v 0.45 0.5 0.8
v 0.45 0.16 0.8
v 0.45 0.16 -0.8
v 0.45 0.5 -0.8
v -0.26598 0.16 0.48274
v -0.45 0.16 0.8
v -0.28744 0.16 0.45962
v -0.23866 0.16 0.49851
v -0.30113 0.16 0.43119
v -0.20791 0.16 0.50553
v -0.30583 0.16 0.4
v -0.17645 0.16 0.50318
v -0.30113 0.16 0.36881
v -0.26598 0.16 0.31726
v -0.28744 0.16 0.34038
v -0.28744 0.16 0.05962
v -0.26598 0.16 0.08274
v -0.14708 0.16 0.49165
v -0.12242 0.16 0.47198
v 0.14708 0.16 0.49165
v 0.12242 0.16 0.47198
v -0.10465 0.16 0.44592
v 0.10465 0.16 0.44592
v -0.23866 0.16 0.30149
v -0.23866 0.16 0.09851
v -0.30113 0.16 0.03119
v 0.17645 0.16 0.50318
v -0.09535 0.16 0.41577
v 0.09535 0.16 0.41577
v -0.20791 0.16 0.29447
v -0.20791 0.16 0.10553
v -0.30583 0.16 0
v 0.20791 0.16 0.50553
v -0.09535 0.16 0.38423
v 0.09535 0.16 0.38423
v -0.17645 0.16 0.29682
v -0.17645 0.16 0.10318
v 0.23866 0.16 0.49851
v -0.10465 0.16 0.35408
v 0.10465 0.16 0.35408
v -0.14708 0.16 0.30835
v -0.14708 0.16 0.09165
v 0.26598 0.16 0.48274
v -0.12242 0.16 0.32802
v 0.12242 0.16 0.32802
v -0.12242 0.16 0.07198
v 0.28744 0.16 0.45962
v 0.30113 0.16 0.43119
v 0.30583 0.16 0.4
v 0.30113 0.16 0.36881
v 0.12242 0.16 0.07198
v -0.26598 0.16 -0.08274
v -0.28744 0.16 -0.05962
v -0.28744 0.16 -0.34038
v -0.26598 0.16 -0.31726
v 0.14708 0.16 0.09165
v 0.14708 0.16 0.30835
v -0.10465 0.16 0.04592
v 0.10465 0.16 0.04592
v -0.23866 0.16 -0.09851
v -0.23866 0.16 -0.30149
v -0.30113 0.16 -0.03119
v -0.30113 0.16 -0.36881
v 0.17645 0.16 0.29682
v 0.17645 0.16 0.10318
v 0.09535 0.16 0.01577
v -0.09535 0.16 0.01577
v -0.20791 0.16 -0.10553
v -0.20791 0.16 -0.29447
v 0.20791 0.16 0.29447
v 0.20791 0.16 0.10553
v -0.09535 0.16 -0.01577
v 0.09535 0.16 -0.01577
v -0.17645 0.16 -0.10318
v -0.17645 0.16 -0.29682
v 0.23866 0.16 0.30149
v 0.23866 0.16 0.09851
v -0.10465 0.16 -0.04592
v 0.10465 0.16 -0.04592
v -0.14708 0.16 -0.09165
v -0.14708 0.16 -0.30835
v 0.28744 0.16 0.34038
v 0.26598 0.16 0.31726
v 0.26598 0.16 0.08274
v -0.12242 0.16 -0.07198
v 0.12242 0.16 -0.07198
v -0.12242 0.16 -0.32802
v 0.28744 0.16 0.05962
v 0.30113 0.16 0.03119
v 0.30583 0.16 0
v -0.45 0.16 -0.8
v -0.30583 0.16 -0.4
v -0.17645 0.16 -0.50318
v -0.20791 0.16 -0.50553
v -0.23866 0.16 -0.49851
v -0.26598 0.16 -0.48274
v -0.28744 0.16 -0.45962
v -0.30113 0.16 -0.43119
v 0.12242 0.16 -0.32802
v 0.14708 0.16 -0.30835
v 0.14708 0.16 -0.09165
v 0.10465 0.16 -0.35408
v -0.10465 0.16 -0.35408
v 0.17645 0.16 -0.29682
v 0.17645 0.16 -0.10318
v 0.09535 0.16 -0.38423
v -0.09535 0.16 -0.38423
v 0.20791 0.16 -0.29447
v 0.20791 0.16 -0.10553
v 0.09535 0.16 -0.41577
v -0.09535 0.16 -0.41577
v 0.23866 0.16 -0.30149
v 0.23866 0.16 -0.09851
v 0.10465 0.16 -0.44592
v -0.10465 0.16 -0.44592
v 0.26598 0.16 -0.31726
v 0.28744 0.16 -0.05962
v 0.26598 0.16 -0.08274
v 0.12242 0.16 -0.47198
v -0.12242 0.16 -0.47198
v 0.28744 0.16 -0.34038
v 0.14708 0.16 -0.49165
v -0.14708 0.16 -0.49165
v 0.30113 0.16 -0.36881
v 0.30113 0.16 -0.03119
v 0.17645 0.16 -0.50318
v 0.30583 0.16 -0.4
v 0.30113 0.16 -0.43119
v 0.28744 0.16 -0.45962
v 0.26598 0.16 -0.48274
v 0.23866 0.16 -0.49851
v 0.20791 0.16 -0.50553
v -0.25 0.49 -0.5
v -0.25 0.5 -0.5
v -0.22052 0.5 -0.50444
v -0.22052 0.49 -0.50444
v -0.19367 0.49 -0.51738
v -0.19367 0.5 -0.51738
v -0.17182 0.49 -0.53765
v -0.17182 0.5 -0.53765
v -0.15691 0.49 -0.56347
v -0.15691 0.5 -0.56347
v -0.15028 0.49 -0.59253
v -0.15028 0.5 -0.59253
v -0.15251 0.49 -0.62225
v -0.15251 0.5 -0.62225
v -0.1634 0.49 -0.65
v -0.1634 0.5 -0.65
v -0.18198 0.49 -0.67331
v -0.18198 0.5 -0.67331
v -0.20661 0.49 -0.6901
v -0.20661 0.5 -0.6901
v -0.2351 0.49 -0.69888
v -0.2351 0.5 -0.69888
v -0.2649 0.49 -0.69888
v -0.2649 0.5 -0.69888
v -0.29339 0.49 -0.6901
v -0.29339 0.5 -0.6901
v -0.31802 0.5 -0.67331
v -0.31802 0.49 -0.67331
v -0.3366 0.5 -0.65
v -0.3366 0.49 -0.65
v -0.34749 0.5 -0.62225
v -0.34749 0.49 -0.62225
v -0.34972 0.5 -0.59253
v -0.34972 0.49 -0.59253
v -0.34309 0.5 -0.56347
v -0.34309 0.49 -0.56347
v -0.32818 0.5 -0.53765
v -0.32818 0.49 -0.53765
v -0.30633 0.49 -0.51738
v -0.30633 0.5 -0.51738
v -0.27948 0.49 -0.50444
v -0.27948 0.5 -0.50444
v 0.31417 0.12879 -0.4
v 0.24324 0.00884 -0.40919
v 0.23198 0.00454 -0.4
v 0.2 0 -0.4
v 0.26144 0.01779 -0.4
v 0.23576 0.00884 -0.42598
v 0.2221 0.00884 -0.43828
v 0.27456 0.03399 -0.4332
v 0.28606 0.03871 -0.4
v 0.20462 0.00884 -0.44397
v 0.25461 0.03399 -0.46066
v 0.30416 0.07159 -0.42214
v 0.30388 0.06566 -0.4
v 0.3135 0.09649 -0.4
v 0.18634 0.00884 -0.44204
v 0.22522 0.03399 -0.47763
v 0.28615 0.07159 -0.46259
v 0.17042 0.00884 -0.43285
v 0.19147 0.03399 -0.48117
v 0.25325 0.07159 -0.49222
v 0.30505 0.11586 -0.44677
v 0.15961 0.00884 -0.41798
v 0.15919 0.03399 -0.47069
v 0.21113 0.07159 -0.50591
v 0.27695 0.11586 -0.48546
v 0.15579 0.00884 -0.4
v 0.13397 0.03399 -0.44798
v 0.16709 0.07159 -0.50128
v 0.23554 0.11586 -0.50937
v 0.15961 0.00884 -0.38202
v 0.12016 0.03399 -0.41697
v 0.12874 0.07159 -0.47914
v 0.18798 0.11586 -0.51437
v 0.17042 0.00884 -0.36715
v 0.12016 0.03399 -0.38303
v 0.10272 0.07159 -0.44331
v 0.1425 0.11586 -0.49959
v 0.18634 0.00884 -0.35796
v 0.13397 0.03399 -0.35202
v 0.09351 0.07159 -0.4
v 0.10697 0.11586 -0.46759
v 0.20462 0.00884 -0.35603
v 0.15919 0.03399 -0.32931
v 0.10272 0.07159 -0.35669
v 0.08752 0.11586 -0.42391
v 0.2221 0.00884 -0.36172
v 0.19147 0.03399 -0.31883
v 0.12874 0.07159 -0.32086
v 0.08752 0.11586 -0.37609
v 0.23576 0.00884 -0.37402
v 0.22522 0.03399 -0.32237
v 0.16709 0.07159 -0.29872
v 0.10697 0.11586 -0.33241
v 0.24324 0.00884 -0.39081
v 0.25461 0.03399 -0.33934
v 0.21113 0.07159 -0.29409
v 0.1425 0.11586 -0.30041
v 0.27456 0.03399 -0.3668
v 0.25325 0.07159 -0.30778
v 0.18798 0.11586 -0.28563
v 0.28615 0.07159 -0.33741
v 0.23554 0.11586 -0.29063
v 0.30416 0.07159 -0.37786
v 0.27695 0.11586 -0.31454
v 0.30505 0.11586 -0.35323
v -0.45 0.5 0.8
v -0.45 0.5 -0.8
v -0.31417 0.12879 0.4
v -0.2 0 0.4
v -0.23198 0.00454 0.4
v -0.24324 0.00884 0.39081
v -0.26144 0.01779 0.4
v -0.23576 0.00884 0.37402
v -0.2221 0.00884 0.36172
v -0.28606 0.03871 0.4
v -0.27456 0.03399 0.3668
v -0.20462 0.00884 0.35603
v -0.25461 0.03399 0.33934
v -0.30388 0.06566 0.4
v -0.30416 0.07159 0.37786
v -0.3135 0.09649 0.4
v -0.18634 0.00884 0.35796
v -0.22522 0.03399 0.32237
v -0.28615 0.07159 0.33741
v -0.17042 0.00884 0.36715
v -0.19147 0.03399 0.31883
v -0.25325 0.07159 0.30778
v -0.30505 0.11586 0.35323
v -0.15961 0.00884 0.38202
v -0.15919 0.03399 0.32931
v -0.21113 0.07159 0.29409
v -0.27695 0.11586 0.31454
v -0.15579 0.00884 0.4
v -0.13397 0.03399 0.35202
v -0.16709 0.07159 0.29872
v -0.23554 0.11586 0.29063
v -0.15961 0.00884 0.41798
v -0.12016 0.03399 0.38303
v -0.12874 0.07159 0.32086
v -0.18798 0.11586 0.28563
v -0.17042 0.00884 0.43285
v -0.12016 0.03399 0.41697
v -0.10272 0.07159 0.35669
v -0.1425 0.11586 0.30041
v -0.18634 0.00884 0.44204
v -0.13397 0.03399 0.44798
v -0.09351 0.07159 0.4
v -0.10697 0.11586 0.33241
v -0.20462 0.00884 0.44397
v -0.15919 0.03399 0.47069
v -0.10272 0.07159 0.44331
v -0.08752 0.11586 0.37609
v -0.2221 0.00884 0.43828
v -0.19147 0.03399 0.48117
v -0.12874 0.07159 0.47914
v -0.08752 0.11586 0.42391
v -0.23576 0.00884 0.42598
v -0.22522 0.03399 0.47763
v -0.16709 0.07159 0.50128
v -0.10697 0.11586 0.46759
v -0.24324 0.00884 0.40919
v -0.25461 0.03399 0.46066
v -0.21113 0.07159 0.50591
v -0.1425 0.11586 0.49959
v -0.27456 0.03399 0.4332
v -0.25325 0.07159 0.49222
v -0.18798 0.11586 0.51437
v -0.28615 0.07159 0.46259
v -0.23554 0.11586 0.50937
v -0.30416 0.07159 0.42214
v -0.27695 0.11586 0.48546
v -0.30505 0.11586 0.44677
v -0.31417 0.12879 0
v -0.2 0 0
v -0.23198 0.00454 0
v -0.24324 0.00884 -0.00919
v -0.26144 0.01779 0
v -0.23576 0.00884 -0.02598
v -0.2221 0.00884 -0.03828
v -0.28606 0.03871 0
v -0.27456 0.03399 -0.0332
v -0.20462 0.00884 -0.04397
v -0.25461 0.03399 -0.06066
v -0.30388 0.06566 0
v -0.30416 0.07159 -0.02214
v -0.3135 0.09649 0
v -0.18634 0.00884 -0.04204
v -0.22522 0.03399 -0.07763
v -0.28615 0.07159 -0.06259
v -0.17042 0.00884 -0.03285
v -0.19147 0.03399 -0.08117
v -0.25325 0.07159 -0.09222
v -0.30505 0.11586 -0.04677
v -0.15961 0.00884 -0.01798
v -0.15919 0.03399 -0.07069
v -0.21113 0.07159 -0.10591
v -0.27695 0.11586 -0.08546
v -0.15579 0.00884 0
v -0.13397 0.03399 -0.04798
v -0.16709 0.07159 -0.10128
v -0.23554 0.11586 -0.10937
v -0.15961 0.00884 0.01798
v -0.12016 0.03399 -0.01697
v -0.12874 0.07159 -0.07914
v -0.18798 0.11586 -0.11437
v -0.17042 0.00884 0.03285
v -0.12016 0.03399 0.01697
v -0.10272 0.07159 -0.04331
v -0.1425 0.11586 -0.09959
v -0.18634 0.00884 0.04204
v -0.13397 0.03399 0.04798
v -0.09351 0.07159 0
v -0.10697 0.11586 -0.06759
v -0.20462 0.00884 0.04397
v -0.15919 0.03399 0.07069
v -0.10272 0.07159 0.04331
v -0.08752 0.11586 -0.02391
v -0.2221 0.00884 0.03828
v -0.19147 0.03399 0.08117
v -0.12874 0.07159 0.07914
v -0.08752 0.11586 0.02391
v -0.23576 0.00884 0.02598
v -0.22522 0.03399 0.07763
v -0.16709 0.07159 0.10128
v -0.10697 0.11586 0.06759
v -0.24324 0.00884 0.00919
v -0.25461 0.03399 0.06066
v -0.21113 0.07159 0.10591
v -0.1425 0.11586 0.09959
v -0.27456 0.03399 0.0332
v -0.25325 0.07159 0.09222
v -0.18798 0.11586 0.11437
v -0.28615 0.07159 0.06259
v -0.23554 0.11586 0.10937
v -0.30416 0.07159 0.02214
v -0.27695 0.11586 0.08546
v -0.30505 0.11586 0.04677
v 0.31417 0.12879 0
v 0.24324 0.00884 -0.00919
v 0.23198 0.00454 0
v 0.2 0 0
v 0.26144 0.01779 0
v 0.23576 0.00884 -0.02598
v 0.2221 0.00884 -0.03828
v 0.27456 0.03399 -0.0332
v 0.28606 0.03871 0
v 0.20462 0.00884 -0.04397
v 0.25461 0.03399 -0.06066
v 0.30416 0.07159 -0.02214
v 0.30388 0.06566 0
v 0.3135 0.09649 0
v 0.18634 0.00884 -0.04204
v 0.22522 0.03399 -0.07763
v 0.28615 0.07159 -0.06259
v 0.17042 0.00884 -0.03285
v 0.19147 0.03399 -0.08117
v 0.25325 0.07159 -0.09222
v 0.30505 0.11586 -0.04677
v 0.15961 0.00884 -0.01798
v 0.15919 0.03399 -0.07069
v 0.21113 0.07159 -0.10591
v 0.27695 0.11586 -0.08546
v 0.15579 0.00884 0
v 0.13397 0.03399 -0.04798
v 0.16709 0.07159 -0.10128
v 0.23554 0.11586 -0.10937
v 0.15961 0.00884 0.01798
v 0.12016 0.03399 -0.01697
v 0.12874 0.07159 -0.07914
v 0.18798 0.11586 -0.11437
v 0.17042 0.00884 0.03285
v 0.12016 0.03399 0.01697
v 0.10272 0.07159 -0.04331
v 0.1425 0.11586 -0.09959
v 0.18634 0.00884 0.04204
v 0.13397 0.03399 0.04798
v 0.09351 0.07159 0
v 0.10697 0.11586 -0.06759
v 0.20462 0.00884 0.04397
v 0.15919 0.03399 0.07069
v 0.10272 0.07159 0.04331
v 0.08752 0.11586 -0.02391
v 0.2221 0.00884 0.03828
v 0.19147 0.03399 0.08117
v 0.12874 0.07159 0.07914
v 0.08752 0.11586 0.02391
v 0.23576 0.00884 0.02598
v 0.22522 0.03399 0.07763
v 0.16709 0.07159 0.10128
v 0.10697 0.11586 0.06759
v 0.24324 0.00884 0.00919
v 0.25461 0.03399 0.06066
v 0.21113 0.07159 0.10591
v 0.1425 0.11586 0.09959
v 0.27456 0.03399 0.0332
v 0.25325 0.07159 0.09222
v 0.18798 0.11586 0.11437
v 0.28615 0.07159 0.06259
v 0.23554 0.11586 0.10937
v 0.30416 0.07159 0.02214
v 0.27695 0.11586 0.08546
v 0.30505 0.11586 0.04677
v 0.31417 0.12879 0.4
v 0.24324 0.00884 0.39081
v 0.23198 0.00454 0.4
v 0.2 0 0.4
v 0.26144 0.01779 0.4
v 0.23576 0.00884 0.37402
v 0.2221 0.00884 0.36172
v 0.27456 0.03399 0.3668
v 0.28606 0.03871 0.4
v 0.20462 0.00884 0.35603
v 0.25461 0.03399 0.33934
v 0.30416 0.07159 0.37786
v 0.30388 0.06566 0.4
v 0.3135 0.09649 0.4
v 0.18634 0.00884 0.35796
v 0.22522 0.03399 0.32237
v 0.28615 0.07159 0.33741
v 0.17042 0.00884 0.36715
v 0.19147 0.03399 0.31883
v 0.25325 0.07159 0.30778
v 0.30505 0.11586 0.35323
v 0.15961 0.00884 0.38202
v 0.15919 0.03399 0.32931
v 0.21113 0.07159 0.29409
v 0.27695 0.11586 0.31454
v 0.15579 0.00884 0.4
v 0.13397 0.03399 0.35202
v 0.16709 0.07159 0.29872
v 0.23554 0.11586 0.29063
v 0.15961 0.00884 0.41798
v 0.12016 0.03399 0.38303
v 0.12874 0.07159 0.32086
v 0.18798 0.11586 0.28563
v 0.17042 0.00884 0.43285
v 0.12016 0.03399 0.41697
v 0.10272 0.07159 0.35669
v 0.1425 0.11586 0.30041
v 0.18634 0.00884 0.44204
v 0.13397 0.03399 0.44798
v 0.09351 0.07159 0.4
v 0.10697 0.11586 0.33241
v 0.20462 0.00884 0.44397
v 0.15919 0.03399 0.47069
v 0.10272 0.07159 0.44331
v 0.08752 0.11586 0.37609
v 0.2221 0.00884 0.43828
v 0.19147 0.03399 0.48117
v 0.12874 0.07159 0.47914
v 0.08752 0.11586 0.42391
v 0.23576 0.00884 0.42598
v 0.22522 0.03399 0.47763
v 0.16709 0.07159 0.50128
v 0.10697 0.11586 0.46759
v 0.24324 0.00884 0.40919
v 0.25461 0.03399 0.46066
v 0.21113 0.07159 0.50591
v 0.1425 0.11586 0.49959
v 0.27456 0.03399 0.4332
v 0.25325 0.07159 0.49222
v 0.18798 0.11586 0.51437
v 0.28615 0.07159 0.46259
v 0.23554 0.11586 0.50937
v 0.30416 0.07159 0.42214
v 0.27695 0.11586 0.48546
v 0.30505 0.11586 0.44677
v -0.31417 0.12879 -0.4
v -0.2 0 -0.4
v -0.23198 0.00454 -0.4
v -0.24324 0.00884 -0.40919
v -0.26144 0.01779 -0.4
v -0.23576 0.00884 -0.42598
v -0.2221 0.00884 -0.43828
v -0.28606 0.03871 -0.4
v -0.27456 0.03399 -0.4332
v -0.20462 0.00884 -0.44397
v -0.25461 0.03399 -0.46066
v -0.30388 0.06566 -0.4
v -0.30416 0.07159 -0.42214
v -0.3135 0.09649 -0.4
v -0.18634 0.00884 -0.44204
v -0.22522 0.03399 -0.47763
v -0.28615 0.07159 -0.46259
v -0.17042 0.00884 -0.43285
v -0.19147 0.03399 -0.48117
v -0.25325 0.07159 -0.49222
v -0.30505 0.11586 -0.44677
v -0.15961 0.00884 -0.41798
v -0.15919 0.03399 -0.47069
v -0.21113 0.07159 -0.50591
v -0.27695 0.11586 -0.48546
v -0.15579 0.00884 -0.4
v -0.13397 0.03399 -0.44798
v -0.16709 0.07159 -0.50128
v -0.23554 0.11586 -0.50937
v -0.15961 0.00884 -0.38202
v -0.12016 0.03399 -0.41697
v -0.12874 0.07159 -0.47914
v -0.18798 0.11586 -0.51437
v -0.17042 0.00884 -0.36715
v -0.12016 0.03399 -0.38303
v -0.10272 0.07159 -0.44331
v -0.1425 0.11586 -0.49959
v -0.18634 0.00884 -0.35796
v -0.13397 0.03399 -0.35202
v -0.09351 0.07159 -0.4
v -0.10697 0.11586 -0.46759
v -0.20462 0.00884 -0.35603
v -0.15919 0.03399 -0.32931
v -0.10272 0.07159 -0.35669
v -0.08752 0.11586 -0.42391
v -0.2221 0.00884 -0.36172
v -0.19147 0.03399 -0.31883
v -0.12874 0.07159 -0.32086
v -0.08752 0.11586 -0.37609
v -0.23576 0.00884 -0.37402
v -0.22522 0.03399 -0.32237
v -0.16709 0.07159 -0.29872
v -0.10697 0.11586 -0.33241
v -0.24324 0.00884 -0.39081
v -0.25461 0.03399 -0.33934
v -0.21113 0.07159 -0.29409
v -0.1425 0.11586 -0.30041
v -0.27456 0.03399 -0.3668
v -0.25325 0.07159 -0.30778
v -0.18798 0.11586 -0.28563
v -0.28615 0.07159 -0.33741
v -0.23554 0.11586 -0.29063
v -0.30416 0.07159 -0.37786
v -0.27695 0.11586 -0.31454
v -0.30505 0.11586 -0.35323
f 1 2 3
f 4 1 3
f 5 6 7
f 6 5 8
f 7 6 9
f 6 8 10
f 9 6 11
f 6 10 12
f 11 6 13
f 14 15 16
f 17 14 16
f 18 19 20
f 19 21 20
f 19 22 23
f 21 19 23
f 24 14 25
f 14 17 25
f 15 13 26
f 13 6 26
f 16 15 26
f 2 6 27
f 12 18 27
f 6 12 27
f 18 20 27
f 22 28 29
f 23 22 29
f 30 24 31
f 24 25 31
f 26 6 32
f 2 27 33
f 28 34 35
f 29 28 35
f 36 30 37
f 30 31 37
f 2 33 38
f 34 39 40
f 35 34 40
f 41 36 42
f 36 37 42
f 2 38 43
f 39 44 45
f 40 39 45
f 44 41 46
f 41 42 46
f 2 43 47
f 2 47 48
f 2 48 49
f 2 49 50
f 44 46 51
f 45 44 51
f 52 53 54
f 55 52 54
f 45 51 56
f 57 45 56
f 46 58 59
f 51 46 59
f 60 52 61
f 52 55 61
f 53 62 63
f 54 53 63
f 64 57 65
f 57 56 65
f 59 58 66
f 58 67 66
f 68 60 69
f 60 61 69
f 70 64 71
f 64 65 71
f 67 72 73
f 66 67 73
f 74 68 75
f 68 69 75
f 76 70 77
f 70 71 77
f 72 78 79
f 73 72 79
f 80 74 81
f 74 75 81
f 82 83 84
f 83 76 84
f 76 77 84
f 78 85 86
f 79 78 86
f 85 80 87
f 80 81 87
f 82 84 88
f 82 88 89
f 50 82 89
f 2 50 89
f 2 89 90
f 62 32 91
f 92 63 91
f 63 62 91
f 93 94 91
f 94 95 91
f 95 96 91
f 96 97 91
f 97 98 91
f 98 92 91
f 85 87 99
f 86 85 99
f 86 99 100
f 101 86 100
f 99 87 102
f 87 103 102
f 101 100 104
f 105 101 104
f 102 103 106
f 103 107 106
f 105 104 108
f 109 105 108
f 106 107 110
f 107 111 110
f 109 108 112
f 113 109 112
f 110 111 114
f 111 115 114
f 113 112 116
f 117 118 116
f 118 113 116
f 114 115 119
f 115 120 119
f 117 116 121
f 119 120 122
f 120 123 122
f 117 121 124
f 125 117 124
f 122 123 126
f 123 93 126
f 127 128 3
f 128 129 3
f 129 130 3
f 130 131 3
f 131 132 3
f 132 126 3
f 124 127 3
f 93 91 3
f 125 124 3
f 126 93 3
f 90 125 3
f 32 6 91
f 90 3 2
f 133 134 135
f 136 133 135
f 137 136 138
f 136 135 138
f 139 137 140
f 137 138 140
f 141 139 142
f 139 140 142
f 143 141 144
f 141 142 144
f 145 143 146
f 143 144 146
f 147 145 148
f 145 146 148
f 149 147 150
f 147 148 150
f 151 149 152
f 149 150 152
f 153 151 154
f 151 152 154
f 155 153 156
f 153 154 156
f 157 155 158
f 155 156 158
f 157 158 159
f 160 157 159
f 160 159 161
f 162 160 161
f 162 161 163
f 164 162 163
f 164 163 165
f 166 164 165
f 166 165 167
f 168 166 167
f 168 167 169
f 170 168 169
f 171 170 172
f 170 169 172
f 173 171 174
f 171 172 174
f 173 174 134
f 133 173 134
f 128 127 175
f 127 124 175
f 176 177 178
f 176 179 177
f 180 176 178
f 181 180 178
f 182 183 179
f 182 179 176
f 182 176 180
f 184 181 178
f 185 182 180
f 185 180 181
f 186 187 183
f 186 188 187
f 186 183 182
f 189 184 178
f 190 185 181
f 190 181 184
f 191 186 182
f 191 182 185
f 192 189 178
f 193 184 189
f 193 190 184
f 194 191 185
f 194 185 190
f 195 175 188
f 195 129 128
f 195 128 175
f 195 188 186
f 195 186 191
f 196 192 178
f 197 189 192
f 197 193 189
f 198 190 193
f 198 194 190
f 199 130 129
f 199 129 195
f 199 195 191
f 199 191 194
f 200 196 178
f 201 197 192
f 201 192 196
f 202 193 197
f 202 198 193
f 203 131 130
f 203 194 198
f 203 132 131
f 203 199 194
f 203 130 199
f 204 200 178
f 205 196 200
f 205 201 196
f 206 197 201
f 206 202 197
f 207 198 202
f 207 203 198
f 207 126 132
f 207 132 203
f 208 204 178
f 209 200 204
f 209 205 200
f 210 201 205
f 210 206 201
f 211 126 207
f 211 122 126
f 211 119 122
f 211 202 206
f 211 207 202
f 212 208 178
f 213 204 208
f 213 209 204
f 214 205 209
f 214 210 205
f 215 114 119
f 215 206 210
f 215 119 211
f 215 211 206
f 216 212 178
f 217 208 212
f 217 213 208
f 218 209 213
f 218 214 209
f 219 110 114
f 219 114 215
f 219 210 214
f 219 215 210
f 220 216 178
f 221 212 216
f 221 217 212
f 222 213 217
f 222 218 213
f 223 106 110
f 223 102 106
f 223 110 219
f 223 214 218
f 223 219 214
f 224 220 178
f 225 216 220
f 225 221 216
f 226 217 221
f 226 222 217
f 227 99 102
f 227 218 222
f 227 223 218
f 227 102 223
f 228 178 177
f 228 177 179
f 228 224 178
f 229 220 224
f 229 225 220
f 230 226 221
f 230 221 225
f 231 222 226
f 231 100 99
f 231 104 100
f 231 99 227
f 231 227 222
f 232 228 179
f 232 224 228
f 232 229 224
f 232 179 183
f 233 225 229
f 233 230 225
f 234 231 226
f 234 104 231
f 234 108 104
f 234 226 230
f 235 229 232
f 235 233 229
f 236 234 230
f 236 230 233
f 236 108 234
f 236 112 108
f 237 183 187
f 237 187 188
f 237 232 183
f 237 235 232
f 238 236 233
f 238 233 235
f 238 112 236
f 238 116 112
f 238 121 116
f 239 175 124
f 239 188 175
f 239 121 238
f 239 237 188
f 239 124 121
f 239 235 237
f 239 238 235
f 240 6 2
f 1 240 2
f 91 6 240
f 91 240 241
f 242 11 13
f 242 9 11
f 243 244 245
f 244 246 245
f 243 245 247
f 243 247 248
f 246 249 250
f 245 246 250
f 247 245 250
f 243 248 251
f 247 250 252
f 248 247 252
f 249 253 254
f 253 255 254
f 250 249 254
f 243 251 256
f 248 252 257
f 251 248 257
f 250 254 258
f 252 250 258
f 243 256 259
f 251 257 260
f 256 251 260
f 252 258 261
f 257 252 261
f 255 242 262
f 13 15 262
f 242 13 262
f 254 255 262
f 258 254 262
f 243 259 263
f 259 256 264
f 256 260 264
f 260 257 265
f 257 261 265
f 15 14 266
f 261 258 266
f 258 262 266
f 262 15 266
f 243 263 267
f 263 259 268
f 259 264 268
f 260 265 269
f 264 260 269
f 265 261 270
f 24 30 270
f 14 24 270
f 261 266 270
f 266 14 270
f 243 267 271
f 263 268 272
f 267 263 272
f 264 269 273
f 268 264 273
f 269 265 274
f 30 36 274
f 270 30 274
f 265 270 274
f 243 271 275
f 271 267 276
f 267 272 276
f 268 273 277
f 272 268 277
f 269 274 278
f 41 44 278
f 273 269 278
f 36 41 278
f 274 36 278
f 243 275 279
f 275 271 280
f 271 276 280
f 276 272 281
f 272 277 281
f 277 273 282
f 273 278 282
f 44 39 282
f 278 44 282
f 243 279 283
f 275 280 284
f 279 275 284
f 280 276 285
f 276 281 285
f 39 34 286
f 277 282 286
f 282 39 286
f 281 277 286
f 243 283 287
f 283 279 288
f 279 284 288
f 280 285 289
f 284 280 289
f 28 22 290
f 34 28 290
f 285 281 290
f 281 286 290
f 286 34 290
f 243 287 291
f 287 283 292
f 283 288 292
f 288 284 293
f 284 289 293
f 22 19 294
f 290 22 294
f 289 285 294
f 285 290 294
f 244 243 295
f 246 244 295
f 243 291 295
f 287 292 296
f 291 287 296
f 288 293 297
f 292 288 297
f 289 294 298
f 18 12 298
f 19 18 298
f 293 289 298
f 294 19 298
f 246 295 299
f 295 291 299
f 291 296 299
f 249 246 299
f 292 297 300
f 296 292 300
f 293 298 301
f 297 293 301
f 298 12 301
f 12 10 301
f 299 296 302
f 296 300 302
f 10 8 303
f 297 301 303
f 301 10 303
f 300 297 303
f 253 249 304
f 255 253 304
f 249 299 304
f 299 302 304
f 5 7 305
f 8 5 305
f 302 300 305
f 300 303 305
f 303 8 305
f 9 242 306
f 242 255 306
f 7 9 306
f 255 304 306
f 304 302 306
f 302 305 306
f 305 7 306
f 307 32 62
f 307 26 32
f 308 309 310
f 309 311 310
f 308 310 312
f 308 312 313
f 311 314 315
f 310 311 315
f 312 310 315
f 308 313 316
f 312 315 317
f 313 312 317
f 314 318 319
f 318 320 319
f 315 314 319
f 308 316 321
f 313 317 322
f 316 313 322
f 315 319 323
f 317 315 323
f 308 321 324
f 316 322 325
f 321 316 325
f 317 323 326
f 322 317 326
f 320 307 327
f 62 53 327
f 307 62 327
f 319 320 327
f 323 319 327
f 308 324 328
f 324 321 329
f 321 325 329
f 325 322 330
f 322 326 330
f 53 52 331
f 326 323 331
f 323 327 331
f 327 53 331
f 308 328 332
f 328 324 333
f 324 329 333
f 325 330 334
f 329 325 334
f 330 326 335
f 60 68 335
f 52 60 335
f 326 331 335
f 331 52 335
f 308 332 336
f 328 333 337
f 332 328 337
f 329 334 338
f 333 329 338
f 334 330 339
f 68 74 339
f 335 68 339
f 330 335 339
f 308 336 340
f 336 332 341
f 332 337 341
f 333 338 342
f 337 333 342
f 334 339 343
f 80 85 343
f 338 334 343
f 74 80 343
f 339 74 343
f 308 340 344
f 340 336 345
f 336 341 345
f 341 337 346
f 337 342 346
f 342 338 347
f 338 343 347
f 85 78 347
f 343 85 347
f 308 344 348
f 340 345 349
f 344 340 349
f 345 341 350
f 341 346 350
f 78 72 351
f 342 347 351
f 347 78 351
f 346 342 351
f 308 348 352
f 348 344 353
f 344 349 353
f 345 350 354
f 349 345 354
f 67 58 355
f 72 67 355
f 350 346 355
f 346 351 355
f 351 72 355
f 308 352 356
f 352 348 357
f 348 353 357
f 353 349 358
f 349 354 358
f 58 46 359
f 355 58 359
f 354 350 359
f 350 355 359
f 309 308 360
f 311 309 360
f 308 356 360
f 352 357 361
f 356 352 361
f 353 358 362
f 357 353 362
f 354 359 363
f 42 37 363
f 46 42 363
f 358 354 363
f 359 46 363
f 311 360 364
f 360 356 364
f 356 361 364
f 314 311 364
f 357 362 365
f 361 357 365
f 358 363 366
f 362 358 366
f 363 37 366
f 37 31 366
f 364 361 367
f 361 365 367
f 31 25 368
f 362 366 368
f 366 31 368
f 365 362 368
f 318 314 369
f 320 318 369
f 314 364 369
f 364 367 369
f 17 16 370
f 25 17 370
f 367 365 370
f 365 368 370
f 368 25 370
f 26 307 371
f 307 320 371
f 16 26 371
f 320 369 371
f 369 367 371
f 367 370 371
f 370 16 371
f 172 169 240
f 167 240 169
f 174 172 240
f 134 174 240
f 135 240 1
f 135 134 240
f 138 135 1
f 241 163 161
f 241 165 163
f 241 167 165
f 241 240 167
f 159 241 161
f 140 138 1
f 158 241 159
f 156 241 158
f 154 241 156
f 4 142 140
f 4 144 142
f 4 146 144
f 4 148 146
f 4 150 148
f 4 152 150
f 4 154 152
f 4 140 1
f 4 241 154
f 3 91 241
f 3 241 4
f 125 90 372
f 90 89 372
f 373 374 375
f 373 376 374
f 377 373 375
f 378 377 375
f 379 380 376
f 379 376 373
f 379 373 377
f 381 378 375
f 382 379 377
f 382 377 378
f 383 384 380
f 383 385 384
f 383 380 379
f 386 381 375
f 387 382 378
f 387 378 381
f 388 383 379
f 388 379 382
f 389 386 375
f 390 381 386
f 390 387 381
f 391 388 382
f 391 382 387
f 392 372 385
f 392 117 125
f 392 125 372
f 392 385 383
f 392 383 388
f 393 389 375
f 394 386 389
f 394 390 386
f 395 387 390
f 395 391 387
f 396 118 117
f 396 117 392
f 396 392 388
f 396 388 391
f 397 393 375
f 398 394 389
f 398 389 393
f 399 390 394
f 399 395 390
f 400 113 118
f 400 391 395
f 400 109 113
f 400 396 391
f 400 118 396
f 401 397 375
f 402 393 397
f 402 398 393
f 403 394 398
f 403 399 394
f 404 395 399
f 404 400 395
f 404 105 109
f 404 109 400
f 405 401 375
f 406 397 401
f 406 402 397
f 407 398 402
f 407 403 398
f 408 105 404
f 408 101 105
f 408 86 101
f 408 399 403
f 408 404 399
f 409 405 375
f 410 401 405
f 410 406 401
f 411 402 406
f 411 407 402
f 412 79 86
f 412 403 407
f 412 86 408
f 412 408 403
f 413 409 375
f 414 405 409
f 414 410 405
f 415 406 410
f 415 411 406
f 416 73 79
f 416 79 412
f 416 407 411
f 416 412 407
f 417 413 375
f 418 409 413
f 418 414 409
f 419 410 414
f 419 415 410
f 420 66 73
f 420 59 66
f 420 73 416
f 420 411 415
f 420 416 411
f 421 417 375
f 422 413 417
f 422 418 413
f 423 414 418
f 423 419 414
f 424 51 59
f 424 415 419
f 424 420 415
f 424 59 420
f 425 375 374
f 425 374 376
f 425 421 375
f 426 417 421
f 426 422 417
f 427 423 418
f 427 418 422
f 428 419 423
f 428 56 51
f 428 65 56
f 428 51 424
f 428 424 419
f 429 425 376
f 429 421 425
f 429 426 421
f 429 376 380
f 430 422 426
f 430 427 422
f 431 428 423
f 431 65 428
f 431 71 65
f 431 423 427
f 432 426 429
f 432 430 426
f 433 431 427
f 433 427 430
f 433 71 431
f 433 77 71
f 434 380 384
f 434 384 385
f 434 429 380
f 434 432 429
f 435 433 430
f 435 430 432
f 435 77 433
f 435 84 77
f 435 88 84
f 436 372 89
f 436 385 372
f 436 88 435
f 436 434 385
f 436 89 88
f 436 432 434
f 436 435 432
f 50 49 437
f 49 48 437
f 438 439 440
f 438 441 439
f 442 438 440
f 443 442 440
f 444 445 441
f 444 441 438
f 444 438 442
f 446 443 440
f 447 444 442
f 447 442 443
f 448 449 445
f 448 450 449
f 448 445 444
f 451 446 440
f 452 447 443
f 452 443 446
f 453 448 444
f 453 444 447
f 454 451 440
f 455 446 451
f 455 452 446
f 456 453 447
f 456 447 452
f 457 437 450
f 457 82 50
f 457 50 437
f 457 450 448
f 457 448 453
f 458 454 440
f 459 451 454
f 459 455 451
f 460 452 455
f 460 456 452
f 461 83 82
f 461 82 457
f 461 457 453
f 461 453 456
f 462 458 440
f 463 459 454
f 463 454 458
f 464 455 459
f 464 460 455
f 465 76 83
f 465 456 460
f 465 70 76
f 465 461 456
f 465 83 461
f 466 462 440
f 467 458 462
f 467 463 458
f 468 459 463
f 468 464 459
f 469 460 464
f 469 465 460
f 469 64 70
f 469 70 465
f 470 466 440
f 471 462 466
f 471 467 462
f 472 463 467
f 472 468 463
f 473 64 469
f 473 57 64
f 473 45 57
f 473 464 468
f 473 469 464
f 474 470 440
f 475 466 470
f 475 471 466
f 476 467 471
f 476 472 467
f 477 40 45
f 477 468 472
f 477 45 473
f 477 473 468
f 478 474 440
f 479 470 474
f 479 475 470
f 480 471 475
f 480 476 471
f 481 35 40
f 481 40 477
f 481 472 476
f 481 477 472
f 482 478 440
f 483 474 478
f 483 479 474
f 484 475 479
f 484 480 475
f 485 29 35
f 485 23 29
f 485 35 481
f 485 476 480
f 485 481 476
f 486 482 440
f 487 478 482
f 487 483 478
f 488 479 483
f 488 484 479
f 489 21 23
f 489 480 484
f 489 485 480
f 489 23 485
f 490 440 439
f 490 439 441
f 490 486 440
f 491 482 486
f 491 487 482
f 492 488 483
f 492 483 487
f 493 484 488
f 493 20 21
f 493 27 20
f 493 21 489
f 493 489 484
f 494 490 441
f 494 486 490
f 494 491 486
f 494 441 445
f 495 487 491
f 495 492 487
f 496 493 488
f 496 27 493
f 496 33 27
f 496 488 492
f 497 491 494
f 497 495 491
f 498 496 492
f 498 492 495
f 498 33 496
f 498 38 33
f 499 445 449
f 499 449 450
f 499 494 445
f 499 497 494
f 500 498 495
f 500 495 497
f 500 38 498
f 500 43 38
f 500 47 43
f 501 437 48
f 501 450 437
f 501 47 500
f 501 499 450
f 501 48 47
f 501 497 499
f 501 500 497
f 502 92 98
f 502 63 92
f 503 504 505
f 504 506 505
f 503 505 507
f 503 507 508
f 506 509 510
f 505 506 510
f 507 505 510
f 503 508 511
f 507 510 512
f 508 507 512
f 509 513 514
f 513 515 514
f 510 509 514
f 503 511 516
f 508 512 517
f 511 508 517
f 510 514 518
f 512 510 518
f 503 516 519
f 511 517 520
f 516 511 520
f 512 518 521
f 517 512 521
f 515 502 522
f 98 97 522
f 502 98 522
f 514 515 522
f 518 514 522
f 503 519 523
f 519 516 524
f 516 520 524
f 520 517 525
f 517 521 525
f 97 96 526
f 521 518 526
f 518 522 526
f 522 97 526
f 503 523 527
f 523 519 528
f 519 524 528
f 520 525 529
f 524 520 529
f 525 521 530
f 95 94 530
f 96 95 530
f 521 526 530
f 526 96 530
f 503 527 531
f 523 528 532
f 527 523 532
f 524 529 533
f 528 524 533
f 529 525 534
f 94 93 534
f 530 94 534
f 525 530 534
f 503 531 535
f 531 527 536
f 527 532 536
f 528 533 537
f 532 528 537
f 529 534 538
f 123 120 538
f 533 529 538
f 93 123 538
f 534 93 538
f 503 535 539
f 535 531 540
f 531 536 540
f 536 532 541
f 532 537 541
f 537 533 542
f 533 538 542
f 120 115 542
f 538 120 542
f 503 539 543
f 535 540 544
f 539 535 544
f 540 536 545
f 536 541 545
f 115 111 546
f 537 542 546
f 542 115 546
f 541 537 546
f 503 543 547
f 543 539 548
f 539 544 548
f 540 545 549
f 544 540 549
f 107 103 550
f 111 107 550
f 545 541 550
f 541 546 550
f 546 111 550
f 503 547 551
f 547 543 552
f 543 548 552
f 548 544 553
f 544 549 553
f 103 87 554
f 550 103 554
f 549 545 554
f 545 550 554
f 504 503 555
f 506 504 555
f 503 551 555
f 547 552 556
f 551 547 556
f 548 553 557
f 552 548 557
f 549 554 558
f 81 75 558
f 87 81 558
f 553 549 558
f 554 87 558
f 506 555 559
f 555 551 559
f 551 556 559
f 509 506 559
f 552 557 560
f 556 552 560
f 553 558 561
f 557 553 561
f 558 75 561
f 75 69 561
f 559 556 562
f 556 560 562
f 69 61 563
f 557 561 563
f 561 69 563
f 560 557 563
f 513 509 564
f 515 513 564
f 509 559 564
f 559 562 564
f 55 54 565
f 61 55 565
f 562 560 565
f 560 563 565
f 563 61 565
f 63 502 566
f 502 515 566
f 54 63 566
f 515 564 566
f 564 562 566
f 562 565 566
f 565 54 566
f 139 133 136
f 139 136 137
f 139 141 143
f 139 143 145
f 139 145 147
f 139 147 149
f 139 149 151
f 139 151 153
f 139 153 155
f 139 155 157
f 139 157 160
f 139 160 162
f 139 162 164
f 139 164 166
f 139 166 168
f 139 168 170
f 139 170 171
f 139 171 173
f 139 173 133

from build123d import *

# Parameters (mm, degrees)
SKETCH1_W           = 0.9
SKETCH1_H           = 1.6
BOSS_EXTRUDE1_DEPTH = 0.34
SKETCH3_R           = 0.1
CUT_EXTRUDE1_DEPTH  = 0.01
LPATTERN1_COUNT     = 2
LPATTERN1_PITCH     = 0.4
LPATTERN1_COL_COUNT = 2
LPATTERN1_COL_PITCH = 0.4


with BuildPart() as part:
    # Sketch1 → Boss-Extrude1 (new body)
    with BuildSketch(Plane(origin=(0, 0.16, 0), x_dir=(1, 0, 0), z_dir=(0, 1, 0))):
        Rectangle(SKETCH1_W, SKETCH1_H)
    extrude(amount=BOSS_EXTRUDE1_DEPTH)

    # Sketch3 → Cut-Extrude1 (cut)
    with BuildSketch(Plane(origin=(0, 0.5, 0), x_dir=(1, 0, 0), z_dir=(0, 1, 0))):
        with Locations(Location((-0.25, 0.6, 0), (0, 0, 270))):
            Circle(SKETCH3_R)
    extrude(amount=-CUT_EXTRUDE1_DEPTH, mode=Mode.SUBTRACT)

    # Sketch2 → Revolve3 (revolve)
    with BuildSketch(Plane.XY):
        with BuildLine():
            Line((-0.2, 0.23), (-0.2, 0))
            ThreePointArc((-0.2, 0), (-0.315, 0.115), (-0.2, 0.23))
        make_face()
    revolve3 = revolve(axis=Axis((-0.2, 0.23, 0), (0, -1, 0)))

    # LPattern1: Revolve3 ×2
    with Locations(*[(0, 0, -i * LPATTERN1_PITCH) for i in range(1, LPATTERN1_COUNT)]):
        add(revolve3)

    # LPattern1 col: Revolve3 ×2
    with Locations(*[(0, 0, i * LPATTERN1_COL_PITCH) for i in range(1, LPATTERN1_COL_COUNT)]):
        add(revolve3)

    # Mirror1: Revolve3 across plane
    add(revolve3.mirror(Plane(origin=(0, 0, 0), x_dir=(0, 0, 1), z_dir=(1, 0, 0))))

    # Mirror1 copy 1 sketch → Mirror1 copy 1 (revolve)
    with BuildSketch(Plane(origin=(0, 0, -0.4), x_dir=(-1, 0, 0), z_dir=(0, 0, 1))):
        with BuildLine():
            Line((-0.2, -0.23), (-0.2, 0))
            ThreePointArc((-0.2, 0), (-0.315, -0.115), (-0.2, -0.23))
        make_face()
    revolve(axis=Axis((0.2, 0.23, -0.4), (0, 1, 0)))

    # Mirror1 copy 2 sketch → Mirror1 copy 2 (revolve)
    with BuildSketch(Plane(origin=(0, 0, 0.4), x_dir=(-1, 0, 0), z_dir=(0, 0, 1))):
        with BuildLine():
            Line((-0.2, -0.23), (-0.2, 0))
            ThreePointArc((-0.2, 0), (-0.315, -0.115), (-0.2, -0.23))
        make_face()
    revolve(axis=Axis((0.2, 0.23, 0.4), (0, 1, 0)))


solid = part.part
